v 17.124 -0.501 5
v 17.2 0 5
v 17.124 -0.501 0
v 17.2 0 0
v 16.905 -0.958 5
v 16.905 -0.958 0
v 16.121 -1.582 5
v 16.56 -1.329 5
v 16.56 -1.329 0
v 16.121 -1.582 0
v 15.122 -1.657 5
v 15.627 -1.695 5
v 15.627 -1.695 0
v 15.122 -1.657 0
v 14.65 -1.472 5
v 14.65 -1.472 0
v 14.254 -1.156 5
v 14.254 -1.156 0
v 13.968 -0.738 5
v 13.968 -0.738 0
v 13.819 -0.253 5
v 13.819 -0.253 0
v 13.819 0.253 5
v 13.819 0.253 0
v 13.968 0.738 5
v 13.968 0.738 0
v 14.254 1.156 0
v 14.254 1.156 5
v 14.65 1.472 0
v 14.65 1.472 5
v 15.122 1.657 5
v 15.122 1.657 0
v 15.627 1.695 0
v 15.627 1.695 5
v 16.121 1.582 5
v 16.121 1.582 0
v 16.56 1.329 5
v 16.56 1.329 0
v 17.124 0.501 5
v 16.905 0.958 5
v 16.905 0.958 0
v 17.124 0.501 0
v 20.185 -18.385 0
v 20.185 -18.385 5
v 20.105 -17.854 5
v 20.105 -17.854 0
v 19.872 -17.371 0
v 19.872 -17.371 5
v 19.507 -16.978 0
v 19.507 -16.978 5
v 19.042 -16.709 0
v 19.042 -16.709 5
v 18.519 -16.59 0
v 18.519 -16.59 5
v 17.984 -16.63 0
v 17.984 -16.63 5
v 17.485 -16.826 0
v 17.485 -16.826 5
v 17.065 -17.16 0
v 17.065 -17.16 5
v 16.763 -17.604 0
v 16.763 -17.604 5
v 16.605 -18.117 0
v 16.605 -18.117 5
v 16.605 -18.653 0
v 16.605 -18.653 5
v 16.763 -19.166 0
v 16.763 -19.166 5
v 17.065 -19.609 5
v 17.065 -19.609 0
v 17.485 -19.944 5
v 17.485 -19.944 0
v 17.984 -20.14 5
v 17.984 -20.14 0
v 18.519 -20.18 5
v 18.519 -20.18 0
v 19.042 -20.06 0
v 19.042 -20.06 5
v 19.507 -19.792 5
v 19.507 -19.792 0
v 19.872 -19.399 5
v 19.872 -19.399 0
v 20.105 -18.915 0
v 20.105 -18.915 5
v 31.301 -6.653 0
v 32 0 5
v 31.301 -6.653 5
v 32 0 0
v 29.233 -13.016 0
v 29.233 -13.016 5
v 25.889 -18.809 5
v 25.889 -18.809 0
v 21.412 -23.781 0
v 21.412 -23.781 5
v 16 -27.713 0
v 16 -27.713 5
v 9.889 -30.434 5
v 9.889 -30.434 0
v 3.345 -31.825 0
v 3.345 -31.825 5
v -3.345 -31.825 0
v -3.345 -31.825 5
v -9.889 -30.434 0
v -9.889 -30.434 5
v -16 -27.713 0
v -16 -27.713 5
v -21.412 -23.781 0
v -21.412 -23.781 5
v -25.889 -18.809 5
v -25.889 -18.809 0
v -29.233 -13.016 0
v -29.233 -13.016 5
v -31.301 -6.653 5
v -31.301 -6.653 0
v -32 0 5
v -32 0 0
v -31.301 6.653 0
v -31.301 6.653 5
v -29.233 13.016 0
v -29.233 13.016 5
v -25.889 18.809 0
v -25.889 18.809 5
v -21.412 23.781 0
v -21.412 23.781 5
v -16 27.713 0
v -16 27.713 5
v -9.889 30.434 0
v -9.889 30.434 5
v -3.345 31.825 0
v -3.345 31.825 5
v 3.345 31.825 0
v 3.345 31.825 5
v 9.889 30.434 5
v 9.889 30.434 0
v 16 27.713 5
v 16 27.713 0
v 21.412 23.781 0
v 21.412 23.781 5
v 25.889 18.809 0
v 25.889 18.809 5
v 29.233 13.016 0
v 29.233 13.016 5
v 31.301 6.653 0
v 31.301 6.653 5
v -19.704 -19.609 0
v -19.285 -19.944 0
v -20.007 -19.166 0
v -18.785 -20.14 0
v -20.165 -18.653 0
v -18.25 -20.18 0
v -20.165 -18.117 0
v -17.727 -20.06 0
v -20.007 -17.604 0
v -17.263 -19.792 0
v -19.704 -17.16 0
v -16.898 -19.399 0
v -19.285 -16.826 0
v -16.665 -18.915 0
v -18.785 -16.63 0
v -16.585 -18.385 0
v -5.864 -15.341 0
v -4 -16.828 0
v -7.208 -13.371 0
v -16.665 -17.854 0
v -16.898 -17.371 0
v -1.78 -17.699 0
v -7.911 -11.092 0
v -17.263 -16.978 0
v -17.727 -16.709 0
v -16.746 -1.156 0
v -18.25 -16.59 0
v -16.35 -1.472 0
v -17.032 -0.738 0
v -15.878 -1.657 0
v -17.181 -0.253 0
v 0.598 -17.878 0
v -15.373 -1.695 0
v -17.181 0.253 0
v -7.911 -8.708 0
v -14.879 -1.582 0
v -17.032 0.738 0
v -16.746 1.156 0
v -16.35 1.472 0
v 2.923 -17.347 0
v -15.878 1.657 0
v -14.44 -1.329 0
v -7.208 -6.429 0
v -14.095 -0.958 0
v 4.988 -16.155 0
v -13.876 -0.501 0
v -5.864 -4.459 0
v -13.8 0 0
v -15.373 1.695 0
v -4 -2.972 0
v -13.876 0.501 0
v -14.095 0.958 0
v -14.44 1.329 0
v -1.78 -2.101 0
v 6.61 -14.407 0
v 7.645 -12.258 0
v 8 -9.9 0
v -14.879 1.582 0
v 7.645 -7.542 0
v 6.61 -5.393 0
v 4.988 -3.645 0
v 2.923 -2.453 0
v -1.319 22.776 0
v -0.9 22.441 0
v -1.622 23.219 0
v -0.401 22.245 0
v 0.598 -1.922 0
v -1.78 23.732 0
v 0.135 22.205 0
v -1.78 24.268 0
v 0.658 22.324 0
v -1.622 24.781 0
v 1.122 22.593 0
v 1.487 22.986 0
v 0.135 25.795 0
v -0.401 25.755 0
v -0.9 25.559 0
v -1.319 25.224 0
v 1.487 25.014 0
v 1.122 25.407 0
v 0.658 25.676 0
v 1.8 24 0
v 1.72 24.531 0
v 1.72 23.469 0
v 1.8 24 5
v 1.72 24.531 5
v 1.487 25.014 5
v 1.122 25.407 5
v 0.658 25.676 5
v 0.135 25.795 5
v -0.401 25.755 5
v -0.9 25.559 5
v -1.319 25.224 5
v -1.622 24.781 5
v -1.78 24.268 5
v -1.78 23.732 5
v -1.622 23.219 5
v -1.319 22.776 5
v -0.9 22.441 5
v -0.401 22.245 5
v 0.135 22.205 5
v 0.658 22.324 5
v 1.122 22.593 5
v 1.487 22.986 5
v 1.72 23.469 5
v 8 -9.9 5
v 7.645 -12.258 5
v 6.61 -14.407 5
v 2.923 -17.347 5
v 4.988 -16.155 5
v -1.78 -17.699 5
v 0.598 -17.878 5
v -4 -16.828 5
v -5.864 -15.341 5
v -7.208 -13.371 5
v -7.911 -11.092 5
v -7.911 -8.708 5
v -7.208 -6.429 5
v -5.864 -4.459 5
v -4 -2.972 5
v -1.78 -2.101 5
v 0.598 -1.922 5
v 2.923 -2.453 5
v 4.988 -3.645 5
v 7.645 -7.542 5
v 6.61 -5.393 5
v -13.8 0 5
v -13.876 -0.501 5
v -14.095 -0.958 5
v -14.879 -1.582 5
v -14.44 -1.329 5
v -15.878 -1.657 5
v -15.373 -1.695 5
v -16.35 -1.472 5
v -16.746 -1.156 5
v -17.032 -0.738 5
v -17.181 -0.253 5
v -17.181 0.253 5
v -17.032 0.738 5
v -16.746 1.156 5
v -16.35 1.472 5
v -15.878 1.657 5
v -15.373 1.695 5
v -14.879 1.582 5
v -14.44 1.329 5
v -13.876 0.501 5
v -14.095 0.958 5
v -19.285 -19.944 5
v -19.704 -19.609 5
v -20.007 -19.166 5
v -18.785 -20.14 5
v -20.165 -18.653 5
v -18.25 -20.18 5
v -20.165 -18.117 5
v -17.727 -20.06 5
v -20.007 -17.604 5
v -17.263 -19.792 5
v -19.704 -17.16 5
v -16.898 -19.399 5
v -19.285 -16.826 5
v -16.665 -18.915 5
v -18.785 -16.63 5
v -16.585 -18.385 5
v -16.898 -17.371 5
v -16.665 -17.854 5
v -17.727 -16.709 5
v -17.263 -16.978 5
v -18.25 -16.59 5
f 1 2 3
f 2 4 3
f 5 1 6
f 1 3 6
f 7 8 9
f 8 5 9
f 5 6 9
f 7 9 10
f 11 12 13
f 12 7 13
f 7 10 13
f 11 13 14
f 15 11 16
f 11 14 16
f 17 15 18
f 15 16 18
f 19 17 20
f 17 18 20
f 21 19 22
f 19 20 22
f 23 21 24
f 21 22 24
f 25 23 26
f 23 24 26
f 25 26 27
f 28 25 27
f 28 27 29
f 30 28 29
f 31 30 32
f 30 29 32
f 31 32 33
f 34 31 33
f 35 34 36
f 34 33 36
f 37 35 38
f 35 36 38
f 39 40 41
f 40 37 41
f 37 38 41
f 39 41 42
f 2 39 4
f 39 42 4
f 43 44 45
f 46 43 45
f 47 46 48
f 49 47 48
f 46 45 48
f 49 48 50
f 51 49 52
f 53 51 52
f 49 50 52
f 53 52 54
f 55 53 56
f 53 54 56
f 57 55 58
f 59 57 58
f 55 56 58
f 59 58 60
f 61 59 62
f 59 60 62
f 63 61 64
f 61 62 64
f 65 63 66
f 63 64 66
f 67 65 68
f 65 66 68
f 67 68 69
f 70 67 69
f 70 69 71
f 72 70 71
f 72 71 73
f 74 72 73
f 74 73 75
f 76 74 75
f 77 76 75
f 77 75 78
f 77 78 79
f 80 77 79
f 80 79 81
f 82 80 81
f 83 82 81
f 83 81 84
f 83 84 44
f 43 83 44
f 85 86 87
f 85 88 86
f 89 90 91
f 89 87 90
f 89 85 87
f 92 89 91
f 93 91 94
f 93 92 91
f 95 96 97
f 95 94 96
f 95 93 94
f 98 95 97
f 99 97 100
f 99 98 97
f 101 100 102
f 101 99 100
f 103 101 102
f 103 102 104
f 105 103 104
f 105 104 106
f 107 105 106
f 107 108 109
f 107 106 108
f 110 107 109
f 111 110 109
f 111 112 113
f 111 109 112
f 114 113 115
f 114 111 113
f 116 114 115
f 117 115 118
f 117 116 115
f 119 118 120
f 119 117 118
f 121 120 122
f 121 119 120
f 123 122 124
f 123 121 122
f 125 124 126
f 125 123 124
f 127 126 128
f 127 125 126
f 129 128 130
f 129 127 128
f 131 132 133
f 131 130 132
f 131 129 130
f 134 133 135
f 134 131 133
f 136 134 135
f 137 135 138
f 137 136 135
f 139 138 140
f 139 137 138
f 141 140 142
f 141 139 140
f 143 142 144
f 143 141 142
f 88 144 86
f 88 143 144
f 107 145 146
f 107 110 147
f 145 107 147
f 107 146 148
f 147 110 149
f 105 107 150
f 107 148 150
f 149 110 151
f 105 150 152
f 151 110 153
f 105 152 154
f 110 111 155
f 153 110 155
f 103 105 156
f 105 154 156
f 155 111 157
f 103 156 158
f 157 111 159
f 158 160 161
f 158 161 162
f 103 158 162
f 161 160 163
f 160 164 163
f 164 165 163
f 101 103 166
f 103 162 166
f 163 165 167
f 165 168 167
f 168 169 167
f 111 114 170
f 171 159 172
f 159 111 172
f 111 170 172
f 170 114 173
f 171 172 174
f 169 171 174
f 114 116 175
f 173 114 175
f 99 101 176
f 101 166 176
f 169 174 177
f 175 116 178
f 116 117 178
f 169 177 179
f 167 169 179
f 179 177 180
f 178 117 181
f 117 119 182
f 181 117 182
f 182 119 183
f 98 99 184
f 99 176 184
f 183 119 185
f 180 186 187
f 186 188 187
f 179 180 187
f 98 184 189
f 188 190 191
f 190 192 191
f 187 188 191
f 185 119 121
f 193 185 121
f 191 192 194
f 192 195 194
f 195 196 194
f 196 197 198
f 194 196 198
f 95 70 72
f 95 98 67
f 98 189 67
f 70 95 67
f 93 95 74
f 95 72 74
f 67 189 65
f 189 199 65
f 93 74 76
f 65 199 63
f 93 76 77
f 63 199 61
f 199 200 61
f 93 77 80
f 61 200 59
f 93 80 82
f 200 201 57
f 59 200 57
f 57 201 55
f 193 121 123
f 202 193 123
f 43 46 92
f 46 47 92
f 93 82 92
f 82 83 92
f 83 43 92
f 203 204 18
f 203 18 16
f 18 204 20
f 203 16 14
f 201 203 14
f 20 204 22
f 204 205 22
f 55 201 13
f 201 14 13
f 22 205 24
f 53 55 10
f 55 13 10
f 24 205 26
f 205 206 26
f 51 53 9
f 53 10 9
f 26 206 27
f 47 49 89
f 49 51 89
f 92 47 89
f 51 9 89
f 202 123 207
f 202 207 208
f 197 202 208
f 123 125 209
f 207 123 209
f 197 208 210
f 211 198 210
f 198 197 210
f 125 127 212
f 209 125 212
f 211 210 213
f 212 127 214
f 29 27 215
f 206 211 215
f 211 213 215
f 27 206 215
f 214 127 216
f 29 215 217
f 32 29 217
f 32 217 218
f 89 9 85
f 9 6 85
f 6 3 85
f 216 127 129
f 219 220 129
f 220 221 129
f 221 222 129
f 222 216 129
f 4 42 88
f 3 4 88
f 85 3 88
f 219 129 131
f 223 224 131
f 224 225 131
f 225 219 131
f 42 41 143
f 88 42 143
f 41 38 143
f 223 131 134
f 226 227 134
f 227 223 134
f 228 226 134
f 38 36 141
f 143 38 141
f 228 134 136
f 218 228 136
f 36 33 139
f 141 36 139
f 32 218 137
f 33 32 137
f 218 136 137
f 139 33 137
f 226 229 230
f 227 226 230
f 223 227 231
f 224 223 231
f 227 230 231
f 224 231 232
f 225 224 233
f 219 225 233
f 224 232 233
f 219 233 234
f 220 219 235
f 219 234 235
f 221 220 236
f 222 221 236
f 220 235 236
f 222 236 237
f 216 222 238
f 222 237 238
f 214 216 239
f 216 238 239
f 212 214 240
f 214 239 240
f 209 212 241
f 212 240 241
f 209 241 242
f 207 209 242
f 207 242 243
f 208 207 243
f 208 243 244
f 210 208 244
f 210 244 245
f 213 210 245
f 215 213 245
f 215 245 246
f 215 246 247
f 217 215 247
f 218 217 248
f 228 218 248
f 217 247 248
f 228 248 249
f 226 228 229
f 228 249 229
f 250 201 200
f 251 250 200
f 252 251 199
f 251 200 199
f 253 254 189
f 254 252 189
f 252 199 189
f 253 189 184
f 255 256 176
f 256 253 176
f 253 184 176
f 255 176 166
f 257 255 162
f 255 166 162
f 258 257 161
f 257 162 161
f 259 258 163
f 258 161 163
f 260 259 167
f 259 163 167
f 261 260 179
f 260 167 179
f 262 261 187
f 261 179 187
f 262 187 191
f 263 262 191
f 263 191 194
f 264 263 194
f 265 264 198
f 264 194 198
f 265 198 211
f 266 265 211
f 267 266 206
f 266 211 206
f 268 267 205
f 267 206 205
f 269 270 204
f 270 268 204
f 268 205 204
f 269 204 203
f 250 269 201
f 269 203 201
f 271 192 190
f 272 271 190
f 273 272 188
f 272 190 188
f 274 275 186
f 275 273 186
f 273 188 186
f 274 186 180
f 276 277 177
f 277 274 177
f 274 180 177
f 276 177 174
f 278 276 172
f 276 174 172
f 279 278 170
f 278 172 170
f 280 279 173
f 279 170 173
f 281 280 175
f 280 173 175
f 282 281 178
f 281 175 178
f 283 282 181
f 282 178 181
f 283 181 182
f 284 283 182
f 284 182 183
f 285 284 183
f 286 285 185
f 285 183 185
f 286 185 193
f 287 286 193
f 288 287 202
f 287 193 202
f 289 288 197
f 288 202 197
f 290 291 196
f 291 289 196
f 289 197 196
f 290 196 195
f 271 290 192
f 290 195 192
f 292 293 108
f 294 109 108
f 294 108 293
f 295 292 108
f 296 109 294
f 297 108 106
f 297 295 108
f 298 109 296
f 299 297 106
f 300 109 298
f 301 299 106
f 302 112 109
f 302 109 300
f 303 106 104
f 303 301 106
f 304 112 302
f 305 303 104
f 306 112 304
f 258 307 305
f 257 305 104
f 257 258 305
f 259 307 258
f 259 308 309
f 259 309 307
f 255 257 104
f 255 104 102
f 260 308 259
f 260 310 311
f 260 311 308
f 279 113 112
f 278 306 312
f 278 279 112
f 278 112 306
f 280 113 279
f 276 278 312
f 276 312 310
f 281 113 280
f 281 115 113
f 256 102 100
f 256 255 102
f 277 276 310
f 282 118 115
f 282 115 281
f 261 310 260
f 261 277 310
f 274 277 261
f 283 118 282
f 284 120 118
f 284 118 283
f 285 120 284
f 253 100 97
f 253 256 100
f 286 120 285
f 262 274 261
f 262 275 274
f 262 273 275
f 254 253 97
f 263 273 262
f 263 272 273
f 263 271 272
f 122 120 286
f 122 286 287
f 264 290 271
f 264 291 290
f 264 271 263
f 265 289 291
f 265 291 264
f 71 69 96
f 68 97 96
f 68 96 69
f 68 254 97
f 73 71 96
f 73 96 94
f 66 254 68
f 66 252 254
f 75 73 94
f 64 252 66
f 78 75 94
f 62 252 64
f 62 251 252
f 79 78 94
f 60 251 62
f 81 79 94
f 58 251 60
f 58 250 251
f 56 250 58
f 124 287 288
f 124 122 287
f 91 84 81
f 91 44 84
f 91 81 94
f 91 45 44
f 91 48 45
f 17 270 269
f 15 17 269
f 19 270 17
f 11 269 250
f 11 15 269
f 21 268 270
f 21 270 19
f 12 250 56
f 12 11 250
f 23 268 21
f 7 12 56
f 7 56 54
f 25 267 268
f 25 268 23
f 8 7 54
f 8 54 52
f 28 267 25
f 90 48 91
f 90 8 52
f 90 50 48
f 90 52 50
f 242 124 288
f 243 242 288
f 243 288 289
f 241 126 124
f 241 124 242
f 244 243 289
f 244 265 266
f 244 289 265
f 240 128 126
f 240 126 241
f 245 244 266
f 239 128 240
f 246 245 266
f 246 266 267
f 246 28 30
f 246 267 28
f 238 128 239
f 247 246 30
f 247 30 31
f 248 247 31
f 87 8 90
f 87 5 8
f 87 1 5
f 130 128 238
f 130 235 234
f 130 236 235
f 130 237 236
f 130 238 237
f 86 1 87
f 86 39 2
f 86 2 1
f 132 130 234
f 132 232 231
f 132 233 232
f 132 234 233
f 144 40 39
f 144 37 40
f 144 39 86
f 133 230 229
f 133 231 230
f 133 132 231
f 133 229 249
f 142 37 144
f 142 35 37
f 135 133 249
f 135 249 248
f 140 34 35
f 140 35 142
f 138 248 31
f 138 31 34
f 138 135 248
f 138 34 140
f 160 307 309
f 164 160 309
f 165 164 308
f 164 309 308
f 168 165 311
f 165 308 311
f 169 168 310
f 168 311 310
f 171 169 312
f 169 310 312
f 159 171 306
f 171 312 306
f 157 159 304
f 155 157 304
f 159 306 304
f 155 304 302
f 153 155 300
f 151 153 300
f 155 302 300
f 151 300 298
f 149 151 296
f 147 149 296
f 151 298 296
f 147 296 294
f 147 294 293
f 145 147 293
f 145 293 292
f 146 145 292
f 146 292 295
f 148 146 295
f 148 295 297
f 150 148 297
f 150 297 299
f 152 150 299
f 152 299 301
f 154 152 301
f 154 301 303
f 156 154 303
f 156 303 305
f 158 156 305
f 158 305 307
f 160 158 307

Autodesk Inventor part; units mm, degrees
ref_plane "YZ Plane" through (0, 0, 0) normal (1, 0, 0) x (0, 1, 0)
ref_plane "XZ Plane" through (0, 0, 0) normal (0, 1, 0) x (-1, 0, 0)
ref_plane "XY Plane" through (0, 0, 0) normal (0, 0, 1) x (1, 0, 0)
sketch "Sketch1" plane through (0, 0, 0) normal (0, 0, 1) x (1, 0, 0)
  circle A0 centre (0, 0) radius 32
  circle A1 centre (-15.5, 0) radius 1.7
  circle A2 centre (15.5, 0) radius 1.7
  circle A3 centre (0, -9.9) radius 8
  circle A4 centre (0, 0) radius 18.5
  dimension "d10" = 16
  dimension "d13" = 64
  dimension "d14" = 37
extrude "Extrusion3" add sketch "Sketch1" along normal blind 5 contours A0 | A4
sketch "Sketch2" plane through (0, 0, 5) normal (0, 0, 1) x (1, 0, 0)
  circle A0 centre (0, -9.9) radius 8 projected
  circle A1 centre (15.5, 0) radius 1.7 projected
  circle A2 centre (-15.5, 0) radius 1.7 projected
  circle A3 centre (0, 0) radius 32 projected
  circle A4 centre (0, 24) radius 1.8
  line L0 (0, 0) -> (-22.6274, -22.6274)
  line L1 (0, 0) -> (-41.0301, 0)
  line L2 (-22.6274, -22.6274) -> (-18.3848, -18.3848)
  circle A5 centre (-18.3848, -18.3848) radius 1.8
  line L3 (0, 0) -> (0, 6.0561)
  circle A6 centre (18.3848, -18.3848) radius 1.8
  dimension "d15" = 3.6
  dimension "d16" = 45
  dimension "d17" = 6
  dimension "d18" = 3.6
  dimension "d21" = 24
extrude "Extrusion4" cut sketch "Sketch2" against normal up to next contours A5 L0 | L0 A5 | A4 | A6
properties part number "SUPORT STEEP 2"
